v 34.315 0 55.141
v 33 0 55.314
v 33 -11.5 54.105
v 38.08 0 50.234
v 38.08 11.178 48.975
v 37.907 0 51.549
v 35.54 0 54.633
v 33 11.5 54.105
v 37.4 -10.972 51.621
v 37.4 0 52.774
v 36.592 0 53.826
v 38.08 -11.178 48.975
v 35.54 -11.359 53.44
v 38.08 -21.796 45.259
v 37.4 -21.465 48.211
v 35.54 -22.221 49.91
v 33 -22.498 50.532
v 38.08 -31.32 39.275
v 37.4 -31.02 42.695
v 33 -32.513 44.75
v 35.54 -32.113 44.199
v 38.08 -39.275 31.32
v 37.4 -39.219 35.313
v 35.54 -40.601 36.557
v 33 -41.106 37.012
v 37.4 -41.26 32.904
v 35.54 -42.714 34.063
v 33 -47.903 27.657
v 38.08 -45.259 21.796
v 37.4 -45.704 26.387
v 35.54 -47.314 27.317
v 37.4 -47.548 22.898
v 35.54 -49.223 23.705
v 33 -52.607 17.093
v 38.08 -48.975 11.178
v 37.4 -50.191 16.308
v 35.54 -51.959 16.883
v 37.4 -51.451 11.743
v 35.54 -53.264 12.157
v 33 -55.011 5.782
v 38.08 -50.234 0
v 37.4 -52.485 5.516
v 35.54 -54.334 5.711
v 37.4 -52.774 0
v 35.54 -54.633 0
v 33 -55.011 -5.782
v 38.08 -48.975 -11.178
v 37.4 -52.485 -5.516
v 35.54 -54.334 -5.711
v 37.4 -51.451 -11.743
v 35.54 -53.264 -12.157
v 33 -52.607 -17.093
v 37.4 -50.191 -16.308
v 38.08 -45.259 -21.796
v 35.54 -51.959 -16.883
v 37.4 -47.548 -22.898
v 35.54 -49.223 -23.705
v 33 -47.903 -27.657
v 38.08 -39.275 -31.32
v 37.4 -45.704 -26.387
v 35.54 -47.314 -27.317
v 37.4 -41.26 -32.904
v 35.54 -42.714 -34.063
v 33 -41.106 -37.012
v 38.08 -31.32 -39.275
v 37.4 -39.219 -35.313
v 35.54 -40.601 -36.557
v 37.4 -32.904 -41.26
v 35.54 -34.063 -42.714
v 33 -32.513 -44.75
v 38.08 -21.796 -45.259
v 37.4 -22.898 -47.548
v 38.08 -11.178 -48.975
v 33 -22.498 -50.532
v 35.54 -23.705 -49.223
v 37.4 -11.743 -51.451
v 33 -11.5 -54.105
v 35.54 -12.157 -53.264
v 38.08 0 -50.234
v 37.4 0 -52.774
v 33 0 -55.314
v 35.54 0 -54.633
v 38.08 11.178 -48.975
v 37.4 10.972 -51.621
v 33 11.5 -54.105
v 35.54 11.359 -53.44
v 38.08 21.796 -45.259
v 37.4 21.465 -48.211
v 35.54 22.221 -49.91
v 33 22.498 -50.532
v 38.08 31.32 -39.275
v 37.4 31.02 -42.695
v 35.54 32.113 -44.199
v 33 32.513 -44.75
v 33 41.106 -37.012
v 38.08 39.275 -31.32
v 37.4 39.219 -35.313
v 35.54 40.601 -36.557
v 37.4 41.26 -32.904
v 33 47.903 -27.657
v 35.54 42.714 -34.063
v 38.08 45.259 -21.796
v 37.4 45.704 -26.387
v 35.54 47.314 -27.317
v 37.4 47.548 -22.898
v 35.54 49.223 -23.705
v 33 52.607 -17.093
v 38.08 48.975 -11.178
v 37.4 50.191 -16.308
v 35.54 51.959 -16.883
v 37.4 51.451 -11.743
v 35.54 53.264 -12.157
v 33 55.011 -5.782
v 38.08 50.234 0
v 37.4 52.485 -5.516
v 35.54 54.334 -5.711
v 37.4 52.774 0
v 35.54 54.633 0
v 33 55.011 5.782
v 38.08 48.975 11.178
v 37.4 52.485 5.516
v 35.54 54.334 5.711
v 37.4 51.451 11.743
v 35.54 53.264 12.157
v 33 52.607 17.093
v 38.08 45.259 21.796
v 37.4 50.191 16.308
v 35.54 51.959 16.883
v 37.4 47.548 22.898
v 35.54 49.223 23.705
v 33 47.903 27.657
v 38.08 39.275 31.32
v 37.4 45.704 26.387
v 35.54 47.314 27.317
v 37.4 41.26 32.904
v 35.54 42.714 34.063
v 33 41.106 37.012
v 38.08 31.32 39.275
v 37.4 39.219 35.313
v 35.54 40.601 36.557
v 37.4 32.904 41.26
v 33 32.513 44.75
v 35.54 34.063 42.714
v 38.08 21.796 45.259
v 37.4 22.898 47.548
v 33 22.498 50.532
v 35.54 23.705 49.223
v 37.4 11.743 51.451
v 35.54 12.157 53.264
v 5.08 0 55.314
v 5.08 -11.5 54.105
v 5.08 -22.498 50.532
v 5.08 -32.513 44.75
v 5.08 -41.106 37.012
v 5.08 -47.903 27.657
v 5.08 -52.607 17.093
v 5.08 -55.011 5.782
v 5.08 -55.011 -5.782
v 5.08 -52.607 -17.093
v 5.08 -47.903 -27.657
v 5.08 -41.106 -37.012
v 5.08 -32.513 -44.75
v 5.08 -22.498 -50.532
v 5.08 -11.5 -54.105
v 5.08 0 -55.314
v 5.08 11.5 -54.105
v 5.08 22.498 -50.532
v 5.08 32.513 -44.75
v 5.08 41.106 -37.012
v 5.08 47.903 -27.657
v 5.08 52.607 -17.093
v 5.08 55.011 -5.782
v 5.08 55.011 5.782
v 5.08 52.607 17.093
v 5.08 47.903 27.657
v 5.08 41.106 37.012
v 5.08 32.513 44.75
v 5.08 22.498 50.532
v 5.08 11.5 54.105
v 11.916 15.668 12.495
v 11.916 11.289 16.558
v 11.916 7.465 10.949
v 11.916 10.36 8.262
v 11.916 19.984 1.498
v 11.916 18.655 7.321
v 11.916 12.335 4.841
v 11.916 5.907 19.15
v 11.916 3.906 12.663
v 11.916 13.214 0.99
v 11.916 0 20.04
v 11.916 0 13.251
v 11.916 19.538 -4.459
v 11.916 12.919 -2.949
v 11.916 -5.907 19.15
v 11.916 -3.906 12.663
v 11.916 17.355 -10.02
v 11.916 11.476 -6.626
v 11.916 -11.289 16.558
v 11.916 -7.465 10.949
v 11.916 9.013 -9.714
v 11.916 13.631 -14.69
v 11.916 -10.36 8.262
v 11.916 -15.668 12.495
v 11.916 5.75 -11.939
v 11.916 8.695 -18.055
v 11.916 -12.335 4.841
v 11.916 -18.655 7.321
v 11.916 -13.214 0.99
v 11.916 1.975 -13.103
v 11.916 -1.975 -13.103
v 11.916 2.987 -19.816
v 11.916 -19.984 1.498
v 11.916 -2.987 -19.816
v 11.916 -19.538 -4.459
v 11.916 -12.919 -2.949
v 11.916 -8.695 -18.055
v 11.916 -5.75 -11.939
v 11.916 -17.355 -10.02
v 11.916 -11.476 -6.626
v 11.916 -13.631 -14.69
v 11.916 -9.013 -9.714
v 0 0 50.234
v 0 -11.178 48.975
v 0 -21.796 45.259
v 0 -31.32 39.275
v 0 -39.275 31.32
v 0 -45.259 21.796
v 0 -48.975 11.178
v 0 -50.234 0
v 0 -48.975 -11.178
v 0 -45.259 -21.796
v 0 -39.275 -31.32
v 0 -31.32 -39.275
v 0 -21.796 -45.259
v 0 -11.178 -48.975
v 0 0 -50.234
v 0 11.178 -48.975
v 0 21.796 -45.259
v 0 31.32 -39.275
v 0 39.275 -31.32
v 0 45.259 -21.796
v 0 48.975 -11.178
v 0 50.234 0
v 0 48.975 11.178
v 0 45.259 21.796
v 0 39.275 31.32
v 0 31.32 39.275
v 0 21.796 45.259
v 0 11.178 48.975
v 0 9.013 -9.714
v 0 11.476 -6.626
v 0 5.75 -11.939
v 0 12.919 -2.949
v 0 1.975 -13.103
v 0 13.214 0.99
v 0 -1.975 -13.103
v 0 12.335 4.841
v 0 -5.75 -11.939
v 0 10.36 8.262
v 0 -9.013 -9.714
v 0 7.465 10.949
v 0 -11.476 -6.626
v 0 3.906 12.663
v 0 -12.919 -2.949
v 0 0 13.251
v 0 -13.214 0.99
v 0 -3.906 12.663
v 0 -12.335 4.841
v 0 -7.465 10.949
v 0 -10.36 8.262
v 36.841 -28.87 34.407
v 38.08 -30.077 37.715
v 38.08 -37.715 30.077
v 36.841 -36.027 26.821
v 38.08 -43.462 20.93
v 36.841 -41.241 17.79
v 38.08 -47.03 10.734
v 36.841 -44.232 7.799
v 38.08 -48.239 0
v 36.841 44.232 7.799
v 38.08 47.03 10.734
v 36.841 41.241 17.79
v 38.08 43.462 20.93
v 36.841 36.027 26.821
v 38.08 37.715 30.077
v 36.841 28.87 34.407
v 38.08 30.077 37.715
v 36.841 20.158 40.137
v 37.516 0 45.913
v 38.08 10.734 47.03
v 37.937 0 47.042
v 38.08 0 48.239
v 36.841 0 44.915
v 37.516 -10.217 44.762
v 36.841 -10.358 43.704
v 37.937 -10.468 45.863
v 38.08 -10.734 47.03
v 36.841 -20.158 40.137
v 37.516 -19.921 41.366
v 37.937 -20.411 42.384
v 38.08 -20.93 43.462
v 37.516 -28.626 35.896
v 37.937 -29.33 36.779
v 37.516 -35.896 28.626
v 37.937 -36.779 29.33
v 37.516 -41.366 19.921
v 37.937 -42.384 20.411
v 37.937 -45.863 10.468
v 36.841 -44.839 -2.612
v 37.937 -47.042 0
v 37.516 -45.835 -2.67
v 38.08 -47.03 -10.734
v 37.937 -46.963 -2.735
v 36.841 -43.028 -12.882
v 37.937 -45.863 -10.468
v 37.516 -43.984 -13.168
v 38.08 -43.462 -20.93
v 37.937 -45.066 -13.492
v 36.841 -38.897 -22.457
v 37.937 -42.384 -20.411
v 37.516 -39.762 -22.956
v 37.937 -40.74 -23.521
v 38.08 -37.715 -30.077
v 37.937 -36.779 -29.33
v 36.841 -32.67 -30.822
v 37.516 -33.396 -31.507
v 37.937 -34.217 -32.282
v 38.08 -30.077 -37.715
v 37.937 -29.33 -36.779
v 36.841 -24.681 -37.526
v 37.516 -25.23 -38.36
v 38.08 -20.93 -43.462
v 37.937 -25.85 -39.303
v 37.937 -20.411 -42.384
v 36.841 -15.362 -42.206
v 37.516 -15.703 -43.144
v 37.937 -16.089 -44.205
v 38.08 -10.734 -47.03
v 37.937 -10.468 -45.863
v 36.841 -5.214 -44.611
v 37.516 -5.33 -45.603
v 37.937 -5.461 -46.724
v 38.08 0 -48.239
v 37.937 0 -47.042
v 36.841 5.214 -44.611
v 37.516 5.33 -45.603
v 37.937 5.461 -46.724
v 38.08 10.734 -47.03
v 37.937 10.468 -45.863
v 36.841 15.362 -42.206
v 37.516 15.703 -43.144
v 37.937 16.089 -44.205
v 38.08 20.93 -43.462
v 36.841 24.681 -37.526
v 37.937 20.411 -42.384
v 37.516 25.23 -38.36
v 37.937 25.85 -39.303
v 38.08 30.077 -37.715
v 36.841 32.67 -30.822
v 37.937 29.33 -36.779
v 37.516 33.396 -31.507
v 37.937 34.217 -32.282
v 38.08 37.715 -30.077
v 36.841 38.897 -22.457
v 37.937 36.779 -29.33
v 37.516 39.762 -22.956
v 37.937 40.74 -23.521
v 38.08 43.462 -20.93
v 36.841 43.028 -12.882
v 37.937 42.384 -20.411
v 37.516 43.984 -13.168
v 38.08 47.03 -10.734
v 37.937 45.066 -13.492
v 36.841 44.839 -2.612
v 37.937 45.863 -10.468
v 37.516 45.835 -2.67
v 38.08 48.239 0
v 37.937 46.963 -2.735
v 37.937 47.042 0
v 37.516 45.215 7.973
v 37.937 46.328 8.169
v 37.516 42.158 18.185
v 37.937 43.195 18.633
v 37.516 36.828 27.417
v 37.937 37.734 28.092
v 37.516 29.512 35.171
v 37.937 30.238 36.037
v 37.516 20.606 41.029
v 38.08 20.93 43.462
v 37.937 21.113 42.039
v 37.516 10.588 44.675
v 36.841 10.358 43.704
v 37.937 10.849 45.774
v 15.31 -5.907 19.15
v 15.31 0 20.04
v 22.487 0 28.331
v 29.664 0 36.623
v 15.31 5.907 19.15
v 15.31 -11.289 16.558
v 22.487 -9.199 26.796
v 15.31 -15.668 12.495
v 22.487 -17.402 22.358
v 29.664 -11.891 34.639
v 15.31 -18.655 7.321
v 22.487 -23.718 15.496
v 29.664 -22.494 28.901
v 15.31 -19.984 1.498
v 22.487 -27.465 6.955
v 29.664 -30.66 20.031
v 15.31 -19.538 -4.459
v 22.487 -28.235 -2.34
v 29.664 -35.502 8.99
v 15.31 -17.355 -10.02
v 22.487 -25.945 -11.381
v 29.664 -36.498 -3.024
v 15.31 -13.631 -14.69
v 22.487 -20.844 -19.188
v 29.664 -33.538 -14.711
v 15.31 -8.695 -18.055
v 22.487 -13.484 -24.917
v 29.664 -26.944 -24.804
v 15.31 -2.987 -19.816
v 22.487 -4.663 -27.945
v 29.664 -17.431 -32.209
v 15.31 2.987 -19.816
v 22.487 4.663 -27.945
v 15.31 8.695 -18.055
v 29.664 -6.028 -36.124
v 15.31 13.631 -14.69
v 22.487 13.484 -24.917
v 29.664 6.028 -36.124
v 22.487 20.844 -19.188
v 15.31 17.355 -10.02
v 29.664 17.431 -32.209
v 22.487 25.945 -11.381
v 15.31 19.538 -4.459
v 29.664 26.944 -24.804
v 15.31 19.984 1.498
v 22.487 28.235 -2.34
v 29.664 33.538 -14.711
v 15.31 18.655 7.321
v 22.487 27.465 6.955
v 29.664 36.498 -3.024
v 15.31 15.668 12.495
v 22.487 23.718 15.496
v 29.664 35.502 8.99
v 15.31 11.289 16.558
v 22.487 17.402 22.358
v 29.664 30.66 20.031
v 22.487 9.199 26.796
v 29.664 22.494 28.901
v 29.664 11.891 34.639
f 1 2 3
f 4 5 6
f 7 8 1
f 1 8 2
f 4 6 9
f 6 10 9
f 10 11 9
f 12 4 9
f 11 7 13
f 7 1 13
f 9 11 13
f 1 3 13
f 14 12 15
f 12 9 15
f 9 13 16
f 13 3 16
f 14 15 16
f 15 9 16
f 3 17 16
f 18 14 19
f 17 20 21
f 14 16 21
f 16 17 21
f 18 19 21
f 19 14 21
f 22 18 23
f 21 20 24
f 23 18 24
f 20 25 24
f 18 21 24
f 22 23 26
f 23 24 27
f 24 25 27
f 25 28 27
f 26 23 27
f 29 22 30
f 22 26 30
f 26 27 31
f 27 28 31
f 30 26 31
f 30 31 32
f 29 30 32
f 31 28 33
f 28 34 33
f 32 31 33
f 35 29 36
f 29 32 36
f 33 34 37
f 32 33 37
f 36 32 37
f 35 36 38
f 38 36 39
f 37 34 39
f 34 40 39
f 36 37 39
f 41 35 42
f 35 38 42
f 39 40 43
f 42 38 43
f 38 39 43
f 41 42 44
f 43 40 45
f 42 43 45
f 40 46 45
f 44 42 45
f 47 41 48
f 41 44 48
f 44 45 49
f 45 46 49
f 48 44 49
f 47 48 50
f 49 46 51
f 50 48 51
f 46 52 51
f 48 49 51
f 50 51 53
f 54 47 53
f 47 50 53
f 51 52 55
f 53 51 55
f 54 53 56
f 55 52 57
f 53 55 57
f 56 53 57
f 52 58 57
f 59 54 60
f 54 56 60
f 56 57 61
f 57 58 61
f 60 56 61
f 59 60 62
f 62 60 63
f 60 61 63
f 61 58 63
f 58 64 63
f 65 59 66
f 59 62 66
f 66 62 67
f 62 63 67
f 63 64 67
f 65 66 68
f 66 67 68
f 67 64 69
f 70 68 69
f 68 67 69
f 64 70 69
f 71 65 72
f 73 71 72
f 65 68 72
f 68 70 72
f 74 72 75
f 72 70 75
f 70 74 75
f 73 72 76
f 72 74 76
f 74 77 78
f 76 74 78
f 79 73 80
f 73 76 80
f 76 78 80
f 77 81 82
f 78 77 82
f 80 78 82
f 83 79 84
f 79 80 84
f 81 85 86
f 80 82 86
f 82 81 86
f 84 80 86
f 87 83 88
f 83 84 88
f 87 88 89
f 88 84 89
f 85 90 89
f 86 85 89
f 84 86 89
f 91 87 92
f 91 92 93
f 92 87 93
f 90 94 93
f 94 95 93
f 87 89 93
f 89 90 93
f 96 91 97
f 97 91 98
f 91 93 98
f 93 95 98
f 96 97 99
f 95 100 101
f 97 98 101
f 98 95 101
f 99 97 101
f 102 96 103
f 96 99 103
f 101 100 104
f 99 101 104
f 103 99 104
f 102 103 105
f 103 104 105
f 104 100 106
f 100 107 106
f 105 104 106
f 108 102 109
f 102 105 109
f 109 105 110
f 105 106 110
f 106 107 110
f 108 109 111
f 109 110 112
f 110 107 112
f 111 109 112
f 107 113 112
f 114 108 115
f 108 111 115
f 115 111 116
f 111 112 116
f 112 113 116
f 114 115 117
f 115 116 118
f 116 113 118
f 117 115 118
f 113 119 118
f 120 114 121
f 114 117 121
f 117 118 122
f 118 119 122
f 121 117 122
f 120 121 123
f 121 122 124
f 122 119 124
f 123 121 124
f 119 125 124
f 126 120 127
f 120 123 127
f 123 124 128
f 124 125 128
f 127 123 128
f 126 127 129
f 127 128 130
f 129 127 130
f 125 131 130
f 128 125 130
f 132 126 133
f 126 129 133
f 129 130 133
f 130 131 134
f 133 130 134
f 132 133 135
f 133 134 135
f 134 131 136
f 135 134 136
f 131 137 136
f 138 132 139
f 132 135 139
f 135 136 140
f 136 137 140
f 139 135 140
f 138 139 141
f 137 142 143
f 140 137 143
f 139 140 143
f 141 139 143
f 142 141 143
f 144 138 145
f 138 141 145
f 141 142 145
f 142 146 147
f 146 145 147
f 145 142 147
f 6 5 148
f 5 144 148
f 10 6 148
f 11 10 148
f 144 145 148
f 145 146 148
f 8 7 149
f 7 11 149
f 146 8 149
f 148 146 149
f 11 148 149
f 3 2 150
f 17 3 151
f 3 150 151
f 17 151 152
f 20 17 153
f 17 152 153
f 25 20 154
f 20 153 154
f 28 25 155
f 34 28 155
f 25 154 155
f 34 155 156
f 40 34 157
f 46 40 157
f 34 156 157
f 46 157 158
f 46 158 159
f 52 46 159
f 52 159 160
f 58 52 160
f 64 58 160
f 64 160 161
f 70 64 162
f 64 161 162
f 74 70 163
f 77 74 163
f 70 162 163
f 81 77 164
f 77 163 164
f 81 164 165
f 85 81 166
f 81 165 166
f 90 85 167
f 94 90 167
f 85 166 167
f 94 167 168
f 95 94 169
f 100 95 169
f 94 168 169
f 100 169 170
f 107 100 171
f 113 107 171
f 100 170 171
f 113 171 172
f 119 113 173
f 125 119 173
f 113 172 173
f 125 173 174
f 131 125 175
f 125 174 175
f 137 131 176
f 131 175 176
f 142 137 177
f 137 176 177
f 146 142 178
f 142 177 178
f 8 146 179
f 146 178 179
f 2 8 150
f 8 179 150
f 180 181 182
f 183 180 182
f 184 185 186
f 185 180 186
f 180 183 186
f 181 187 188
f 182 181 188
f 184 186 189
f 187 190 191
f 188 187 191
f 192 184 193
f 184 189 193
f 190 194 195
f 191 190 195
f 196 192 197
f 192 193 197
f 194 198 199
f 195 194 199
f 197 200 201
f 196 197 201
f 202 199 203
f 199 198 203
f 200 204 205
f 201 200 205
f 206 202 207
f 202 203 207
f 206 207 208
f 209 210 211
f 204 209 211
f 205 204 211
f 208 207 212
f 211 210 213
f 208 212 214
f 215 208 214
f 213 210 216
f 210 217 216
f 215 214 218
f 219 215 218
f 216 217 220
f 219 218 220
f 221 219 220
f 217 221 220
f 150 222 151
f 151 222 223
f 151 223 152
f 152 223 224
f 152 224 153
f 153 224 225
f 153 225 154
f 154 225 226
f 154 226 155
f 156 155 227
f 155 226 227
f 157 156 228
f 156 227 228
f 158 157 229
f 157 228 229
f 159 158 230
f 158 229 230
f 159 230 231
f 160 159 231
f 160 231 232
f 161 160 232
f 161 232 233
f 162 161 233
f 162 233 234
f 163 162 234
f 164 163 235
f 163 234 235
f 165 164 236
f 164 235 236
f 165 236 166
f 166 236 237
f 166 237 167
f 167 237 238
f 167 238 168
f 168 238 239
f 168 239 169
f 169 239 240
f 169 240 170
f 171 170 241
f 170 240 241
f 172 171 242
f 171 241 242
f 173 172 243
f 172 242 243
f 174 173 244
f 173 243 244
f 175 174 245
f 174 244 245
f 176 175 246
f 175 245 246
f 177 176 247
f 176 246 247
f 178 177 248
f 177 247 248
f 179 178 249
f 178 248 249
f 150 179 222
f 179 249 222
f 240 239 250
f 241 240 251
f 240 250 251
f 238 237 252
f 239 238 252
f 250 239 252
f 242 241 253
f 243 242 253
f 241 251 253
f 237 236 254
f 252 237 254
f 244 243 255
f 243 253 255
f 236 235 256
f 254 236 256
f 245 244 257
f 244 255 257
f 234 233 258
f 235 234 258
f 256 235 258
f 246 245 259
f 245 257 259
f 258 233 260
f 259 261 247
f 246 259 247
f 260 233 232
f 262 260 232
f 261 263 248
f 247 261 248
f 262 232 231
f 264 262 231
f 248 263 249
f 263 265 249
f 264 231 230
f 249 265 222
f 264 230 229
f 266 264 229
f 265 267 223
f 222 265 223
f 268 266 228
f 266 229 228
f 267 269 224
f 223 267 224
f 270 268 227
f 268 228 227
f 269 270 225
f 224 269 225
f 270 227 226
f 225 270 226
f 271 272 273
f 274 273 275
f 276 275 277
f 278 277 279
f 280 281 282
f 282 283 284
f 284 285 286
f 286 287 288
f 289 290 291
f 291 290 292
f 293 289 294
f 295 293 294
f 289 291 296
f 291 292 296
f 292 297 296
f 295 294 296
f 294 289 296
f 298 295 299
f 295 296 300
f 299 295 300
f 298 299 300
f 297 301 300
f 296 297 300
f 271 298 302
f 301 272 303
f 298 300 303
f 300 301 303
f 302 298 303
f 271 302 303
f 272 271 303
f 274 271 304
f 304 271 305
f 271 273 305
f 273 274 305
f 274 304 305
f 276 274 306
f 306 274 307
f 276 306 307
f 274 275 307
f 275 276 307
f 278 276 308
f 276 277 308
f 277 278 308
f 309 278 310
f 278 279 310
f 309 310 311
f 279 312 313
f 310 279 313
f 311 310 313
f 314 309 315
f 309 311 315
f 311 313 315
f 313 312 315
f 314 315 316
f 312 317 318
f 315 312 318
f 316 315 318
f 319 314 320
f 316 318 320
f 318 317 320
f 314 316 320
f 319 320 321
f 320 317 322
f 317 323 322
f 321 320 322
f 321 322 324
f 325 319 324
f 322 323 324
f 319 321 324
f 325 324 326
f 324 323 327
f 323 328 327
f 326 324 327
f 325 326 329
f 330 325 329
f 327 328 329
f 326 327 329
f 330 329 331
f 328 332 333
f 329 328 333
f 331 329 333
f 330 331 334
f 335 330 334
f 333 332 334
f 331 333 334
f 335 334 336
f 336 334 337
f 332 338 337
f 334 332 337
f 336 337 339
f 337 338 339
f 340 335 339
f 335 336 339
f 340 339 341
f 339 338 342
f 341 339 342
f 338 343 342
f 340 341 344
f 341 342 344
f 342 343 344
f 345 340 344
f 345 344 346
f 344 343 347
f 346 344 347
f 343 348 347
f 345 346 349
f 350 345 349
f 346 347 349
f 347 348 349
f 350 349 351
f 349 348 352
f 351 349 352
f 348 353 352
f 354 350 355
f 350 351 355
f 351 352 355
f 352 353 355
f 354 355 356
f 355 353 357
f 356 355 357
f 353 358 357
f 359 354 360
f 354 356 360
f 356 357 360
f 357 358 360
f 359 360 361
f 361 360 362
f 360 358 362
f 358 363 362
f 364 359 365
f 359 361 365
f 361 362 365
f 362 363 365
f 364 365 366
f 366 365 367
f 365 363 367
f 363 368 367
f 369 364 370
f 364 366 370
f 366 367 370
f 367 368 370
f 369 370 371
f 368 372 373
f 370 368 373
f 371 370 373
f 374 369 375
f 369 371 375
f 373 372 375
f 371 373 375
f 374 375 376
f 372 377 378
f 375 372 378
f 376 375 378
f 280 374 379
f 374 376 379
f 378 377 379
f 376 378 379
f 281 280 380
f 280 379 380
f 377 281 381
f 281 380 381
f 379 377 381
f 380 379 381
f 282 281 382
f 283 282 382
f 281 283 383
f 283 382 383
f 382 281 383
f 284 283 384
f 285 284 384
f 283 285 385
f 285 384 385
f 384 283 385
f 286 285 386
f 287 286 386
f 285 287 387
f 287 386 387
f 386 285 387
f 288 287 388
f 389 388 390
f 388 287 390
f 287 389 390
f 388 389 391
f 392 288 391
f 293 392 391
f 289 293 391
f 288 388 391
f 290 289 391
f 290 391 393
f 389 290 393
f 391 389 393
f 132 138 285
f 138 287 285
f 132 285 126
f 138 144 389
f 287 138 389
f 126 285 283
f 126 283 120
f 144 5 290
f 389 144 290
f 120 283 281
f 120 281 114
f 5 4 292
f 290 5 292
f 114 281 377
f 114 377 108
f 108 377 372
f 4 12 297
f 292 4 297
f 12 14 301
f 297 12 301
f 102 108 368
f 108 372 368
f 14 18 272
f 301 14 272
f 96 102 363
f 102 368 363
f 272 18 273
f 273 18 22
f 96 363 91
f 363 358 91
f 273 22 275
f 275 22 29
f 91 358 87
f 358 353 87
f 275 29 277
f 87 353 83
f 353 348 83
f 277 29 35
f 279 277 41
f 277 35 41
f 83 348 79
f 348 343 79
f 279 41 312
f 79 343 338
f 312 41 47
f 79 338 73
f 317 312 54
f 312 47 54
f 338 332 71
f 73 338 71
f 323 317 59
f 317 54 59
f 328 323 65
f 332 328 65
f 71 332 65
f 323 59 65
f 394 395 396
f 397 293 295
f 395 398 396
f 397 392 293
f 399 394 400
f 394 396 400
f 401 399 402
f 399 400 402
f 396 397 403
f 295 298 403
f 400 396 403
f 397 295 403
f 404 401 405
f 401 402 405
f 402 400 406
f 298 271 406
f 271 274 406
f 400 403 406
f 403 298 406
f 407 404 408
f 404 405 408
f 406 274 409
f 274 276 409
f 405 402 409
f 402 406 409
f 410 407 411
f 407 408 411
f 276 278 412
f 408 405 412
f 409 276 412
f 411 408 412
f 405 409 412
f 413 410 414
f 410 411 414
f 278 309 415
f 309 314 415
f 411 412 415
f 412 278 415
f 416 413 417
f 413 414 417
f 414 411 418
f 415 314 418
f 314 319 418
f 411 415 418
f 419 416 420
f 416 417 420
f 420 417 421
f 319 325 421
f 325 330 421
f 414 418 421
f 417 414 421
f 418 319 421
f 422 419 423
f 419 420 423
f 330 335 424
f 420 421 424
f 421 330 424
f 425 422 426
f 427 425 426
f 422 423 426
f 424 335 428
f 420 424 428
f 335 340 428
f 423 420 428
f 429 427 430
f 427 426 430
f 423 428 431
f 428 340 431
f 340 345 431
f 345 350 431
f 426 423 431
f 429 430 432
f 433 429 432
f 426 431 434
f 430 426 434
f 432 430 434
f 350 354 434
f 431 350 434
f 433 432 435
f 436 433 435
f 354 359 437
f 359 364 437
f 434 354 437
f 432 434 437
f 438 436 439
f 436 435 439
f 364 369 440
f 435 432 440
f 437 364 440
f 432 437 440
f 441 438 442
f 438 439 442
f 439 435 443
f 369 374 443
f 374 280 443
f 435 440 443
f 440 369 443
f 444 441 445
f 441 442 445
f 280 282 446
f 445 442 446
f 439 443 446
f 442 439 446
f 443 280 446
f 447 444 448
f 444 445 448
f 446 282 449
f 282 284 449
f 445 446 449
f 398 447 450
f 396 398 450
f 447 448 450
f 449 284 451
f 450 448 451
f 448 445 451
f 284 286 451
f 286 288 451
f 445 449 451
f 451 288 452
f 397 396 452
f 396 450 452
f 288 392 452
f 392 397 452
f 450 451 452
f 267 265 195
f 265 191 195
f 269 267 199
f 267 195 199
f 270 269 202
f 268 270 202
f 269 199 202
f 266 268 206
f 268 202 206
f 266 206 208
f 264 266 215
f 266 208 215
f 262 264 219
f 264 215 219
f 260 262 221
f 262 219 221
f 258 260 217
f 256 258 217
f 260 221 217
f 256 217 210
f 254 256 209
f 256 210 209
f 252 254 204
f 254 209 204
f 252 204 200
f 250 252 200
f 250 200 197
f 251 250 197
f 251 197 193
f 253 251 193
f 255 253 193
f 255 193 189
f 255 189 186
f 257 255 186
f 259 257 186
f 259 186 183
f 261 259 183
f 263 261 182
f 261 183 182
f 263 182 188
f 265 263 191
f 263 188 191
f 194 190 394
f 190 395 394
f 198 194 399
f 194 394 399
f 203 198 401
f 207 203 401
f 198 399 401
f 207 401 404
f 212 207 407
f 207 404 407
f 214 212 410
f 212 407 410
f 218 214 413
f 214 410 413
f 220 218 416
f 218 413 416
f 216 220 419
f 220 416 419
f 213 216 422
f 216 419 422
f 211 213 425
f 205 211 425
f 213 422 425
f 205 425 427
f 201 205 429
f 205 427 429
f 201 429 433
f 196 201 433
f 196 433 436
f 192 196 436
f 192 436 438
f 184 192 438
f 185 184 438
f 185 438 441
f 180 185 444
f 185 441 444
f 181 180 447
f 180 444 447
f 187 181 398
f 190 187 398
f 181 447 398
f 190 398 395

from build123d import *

# Parameters (mm, degrees)
F2_R    = 5.08
F3_SIZE = 5.08


with BuildPart() as f1:
    # F0 (on Front) → F1 (revolve)
    with BuildSketch(Plane.XZ):
        Polygon((0, 55.314001), (0, 13.251298), (11.915691, 13.251298), (11.915691, 20.03995), (15.310015, 20.03995), (38.080281, 46.34597), (38.080281, 55.314001), align=None)
    revolve(axis=Axis((25.323285, 0, 0), (1, 0, 0)))

    # F2
    f2_edges = [f1.edges().sort_by_distance(p)[0] for p in [
        (38.080281, 0, -46.34597),
        (38.080281, 0, -55.314001),
    ]]
    fillet(f2_edges, radius=F2_R)

    # F3
    f3_edges = [f1.edges().sort_by_distance(p)[0] for p in [
        (0, 0, -55.314001),
    ]]
    chamfer(f3_edges, length=F3_SIZE)


solid = f1.part
